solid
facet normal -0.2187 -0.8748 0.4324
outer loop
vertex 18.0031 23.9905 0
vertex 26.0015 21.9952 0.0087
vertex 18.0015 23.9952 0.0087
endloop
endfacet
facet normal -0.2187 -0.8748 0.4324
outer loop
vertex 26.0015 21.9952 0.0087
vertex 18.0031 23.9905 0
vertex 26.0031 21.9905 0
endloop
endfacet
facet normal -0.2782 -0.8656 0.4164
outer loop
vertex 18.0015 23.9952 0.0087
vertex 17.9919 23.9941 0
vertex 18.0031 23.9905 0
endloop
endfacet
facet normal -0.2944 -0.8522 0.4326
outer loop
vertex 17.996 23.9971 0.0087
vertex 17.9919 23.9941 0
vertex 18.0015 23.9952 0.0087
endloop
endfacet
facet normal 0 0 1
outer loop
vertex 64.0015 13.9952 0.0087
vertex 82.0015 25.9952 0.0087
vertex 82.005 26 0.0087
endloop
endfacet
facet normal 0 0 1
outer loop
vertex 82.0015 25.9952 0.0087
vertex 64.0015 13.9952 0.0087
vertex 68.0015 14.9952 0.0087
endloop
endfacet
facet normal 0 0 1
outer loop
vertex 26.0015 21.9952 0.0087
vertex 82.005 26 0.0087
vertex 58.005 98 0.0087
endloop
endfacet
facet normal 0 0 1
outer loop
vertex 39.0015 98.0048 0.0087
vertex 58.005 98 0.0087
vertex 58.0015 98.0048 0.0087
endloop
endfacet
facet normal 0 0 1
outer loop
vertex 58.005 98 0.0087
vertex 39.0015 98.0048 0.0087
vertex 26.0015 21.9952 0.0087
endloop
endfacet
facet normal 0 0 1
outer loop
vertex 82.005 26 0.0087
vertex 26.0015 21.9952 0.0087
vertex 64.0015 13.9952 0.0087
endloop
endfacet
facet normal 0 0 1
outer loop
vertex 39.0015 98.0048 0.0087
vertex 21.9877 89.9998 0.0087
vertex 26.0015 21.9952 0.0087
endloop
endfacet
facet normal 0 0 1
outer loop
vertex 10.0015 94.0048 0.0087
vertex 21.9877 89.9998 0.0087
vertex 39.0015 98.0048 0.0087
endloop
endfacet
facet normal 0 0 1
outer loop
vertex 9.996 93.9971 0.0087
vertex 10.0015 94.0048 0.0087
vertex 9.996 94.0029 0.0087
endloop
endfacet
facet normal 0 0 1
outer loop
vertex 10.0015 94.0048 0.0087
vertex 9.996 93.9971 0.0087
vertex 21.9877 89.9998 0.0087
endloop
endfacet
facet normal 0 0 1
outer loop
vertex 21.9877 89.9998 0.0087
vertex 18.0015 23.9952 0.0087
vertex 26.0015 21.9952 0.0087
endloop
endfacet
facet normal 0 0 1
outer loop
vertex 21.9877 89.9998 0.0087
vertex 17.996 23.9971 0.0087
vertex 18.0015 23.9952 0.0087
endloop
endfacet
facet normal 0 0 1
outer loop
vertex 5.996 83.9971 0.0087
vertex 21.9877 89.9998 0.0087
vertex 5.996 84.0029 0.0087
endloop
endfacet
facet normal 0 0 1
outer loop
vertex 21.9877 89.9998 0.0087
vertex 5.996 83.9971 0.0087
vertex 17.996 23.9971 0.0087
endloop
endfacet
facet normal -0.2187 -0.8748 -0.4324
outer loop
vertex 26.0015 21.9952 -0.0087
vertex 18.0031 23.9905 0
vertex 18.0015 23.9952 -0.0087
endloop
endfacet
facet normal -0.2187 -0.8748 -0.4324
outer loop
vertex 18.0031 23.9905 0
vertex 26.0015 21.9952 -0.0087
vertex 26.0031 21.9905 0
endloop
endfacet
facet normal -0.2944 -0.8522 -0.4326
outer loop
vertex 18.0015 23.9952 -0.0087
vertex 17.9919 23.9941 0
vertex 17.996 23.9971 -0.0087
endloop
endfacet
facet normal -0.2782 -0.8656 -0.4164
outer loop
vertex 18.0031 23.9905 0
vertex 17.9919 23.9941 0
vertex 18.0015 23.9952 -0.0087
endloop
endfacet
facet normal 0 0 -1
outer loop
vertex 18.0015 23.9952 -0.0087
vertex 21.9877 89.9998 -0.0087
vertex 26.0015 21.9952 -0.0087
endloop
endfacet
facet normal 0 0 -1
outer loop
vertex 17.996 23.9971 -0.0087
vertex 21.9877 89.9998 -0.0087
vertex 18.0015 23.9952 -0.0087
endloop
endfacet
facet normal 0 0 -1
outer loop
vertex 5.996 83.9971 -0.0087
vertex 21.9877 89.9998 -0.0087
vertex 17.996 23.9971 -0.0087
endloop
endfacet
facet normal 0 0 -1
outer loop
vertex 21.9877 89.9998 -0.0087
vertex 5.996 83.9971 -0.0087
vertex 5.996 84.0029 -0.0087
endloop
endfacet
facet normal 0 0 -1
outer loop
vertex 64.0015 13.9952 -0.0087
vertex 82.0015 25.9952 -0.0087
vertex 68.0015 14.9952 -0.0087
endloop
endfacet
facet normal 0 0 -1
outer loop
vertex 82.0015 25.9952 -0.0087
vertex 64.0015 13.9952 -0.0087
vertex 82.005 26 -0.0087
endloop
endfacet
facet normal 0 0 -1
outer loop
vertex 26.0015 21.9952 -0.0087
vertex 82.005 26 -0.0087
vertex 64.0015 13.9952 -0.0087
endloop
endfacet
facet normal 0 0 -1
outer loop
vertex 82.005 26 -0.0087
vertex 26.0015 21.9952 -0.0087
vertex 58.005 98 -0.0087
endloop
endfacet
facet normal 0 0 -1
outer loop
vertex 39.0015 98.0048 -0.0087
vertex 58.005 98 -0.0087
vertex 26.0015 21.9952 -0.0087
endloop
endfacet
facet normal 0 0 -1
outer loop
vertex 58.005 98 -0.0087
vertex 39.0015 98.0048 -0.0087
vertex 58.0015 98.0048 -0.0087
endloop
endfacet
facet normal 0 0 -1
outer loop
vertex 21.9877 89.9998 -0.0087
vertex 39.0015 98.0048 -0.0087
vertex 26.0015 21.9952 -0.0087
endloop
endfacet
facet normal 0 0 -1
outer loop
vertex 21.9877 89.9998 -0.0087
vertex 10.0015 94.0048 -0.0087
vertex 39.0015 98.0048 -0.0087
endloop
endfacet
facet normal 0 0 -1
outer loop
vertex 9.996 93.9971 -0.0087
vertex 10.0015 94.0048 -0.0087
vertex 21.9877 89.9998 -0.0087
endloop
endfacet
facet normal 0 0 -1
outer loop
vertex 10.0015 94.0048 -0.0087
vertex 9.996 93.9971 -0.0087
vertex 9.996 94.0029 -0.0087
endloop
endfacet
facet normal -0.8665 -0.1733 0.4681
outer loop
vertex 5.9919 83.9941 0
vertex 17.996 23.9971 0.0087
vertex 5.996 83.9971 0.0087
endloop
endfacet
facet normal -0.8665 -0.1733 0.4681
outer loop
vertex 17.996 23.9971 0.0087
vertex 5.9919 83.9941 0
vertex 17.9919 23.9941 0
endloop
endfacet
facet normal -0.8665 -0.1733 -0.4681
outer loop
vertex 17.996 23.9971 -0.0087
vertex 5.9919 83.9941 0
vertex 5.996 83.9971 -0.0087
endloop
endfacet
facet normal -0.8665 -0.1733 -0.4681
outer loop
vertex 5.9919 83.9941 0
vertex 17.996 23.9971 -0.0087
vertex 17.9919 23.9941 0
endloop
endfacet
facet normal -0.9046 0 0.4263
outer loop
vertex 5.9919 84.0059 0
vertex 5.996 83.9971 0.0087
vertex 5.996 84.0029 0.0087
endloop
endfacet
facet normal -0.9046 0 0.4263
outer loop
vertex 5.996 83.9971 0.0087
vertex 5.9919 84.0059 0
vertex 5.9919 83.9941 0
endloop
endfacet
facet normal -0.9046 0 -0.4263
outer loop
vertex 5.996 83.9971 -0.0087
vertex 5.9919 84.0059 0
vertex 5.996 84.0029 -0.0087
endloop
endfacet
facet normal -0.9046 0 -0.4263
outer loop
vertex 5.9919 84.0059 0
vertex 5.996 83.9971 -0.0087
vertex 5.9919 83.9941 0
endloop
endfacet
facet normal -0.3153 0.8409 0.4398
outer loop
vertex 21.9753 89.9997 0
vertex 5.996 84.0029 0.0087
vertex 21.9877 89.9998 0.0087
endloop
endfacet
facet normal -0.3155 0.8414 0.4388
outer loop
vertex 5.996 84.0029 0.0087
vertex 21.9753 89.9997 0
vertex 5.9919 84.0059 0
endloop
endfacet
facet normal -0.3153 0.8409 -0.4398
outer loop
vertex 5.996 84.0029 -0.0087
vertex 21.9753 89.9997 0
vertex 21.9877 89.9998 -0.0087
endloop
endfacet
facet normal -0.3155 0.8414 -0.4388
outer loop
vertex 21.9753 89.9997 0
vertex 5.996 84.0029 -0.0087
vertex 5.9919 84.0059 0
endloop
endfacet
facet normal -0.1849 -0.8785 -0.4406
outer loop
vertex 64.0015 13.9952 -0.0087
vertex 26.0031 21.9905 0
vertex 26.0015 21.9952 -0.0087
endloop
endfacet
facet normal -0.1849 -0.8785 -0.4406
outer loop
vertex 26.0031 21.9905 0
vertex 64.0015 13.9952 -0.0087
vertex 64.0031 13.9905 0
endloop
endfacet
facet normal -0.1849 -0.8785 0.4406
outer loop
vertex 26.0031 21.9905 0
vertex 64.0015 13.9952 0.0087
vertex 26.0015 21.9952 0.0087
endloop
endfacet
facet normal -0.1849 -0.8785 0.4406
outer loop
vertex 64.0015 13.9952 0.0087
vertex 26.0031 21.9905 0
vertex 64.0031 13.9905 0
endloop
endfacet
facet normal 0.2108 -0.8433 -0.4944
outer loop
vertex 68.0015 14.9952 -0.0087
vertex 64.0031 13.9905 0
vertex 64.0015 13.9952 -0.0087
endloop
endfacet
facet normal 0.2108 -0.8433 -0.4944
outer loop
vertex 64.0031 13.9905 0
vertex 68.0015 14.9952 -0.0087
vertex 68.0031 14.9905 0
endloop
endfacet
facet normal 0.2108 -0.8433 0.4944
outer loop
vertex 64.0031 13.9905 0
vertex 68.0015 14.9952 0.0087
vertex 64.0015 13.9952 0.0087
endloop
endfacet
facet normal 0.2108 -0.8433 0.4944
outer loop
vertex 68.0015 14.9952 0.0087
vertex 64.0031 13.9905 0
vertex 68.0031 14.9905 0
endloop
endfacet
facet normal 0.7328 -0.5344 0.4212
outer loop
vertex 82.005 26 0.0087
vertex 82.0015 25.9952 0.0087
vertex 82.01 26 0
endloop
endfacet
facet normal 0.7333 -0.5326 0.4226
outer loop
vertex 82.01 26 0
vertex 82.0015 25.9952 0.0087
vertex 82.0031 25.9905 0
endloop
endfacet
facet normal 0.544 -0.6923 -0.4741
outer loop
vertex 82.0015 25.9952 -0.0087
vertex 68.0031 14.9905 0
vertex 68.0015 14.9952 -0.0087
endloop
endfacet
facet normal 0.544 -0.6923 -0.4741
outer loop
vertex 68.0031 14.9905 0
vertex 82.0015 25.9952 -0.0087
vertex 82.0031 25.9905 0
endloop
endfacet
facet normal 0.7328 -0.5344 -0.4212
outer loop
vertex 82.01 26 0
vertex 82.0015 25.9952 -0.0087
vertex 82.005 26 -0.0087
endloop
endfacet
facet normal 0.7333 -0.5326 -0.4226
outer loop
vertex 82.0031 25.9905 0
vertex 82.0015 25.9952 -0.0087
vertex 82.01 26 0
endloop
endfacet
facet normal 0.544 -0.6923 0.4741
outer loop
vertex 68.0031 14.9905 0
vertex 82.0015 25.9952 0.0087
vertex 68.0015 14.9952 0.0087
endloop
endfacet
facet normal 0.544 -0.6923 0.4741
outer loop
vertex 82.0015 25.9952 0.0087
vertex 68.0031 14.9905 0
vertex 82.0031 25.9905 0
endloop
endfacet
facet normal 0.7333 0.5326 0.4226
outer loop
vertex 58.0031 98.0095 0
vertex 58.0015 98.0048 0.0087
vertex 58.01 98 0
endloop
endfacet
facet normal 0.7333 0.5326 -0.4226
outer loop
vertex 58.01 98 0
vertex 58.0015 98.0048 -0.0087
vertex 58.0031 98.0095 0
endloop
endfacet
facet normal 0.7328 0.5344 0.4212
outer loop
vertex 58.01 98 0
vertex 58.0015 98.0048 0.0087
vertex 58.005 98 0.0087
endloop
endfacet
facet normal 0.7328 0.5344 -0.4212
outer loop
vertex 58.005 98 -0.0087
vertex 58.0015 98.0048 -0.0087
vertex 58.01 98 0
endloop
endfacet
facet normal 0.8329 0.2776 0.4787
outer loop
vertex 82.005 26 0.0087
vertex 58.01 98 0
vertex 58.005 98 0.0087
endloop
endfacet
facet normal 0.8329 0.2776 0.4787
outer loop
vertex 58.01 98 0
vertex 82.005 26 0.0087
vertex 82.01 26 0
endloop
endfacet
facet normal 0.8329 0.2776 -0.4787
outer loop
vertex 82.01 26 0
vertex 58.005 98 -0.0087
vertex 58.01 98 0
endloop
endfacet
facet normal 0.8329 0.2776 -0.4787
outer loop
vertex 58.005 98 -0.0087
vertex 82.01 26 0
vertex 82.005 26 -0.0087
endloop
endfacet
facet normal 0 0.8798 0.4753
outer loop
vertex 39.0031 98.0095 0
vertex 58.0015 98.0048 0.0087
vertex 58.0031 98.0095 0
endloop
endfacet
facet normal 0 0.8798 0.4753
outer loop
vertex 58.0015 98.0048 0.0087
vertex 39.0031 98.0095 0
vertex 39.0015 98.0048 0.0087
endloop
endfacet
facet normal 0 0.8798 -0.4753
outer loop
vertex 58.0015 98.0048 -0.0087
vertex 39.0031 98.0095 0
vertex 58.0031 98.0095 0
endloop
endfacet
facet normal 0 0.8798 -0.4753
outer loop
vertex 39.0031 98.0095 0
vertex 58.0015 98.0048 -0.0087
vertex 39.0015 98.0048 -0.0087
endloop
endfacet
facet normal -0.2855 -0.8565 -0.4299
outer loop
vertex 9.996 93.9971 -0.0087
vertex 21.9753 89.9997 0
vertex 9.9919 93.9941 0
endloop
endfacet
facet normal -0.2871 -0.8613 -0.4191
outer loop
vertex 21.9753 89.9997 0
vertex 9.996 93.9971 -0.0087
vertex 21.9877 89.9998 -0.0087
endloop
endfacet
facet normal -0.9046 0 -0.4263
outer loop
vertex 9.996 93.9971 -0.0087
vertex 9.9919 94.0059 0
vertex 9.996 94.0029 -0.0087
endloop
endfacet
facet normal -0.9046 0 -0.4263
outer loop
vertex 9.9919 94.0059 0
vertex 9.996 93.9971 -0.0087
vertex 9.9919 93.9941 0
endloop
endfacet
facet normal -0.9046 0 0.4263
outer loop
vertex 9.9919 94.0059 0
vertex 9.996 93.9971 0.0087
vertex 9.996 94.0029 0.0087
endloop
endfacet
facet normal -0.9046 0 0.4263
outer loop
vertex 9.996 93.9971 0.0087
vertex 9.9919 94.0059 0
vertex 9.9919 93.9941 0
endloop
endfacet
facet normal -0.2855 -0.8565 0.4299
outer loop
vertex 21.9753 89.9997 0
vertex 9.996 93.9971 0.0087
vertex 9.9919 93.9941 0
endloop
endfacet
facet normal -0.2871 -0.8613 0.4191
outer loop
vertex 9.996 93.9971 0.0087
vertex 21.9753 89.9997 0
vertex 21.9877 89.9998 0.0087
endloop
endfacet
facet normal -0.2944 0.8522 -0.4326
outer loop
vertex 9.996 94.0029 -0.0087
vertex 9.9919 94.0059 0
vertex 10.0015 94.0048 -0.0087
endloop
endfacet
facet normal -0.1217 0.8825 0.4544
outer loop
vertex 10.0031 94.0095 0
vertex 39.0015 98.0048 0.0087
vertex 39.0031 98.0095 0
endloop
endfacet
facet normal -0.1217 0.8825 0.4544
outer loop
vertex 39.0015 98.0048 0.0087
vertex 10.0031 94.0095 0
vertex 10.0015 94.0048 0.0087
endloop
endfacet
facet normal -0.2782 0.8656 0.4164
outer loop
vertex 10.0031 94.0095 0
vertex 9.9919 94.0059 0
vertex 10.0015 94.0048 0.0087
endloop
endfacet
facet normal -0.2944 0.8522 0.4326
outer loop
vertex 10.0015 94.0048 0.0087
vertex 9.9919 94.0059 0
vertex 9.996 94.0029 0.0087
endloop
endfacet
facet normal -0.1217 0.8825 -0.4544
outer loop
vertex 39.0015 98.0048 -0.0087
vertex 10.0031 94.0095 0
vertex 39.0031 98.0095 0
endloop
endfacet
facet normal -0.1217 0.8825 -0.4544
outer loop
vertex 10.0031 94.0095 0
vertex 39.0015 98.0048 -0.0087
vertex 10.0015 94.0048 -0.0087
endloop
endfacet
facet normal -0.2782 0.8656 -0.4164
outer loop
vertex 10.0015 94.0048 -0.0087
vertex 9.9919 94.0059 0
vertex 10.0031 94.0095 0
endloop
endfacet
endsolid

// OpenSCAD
color([0.5738800220993816,0.8494037217359881,0.24323676398212035]) hull(){
    translate([18,58]) sphere(0.01);
    translate([26,22]) sphere(0.01);
    translate([18,24]) sphere(0.01);
}
color([0.8402878098664139,0.9530478541805099,0.16594803365564914]) hull(){
    translate([18,58]) sphere(0.01);
    translate([18,24]) sphere(0.01);
    translate([6,84]) sphere(0.01);
}
color([0.0023370868964924796,0.7387895340607371,0.5374530602666081]) hull(){
    translate([18,58]) sphere(0.01);
    translate([6,84]) sphere(0.01);
    translate([22,90]) sphere(0.01);
}
color([0.25604025835089217,0.4320068924153808,0.5112453323210508]) hull(){
    translate([18,58]) sphere(0.01);
    translate([22,90]) sphere(0.01);
    translate([44,55]) sphere(0.01);
}
color([0.7462272619347637,0.5039790716190428,0.8850839351693509]) hull(){
    translate([18,58]) sphere(0.01);
    translate([44,55]) sphere(0.01);
    translate([44,47]) sphere(0.01);
}
color([0.6652757233710683,0.22263754843686523,0.08942086350367451]) hull(){
    translate([18,58]) sphere(0.01);
    translate([26,22]) sphere(0.01);
    translate([44,47]) sphere(0.01);
}
color([0.6195232841458308,0.9036720387350747,0.7222923954673625]) hull(){
    translate([44,47]) sphere(0.01);
    translate([26,22]) sphere(0.01);
    translate([42,29]) sphere(0.01);
}
color([0.6665075097113882,0.5421139713900744,0.6943978877819516]) hull(){
    translate([44,47]) sphere(0.01);
    translate([42,29]) sphere(0.01);
    translate([44,55]) sphere(0.01);
}
color([0.9269770591996176,0.12480324665016229,0.8422397758241813]) hull(){
    translate([44,47]) sphere(0.01);
    translate([44,55]) sphere(0.01);
    translate([58,33]) sphere(0.01);
}
color([0.028249143050612435,0.8554899328562455,0.6212809598996976]) hull(){
    translate([44,47]) sphere(0.01);
    translate([58,33]) sphere(0.01);
    translate([42,29]) sphere(0.01);
}
color([0.6435486749275994,0.4857227915978113,0.2898251547629681]) hull(){
    translate([42,29]) sphere(0.01);
    translate([26,22]) sphere(0.01);
    translate([64,14]) sphere(0.01);
}
color([0.21709076393122206,0.4979948584580751,0.6176241526046676]) hull(){
    translate([42,29]) sphere(0.01);
    translate([64,14]) sphere(0.01);
    translate([58,33]) sphere(0.01);
}
color([0.4722249532281336,0.7228331534363125,0.6109414561657331]) hull(){
    translate([58,33]) sphere(0.01);
    translate([64,14]) sphere(0.01);
    translate([68,15]) sphere(0.01);
}
color([0.5330085163671737,0.6769359871291822,0.5973748769978083]) hull(){
    translate([58,33]) sphere(0.01);
    translate([68,15]) sphere(0.01);
    translate([82,26]) sphere(0.01);
}
color([0.14460255854654236,0.21273280877313017,0.8417179364881341]) hull(){
    translate([58,33]) sphere(0.01);
    translate([82,26]) sphere(0.01);
    translate([44,55]) sphere(0.01);
}
color([0.6300391880279899,0.5103677782275869,0.4479627161837708]) hull(){
    translate([44,55]) sphere(0.01);
    translate([82,26]) sphere(0.01);
    translate([50,93]) sphere(0.01);
}
color([0.2903518628620462,0.1744676713524972,0.5457372127765215]) hull(){
    translate([44,55]) sphere(0.01);
    translate([50,93]) sphere(0.01);
    translate([22,90]) sphere(0.01);
}
color([0.6340658375422632,0.7004271366493812,0.690956934786038]) hull(){
    translate([50,93]) sphere(0.01);
    translate([82,26]) sphere(0.01);
    translate([58,98]) sphere(0.01);
}
color([0.013948469234104865,0.8018456354370093,0.2607079205191076]) hull(){
    translate([50,93]) sphere(0.01);
    translate([58,98]) sphere(0.01);
    translate([39,98]) sphere(0.01);
}
color([0.01899716010339858,0.7507132946374245,0.44168653561511173]) hull(){
    translate([50,93]) sphere(0.01);
    translate([39,98]) sphere(0.01);
    translate([22,90]) sphere(0.01);
}
color([0.1668653701245908,0.45955837321901094,0.7876756969907556]) hull(){
    translate([22,90]) sphere(0.01);
    translate([39,98]) sphere(0.01);
    translate([10,94]) sphere(0.01);
}
